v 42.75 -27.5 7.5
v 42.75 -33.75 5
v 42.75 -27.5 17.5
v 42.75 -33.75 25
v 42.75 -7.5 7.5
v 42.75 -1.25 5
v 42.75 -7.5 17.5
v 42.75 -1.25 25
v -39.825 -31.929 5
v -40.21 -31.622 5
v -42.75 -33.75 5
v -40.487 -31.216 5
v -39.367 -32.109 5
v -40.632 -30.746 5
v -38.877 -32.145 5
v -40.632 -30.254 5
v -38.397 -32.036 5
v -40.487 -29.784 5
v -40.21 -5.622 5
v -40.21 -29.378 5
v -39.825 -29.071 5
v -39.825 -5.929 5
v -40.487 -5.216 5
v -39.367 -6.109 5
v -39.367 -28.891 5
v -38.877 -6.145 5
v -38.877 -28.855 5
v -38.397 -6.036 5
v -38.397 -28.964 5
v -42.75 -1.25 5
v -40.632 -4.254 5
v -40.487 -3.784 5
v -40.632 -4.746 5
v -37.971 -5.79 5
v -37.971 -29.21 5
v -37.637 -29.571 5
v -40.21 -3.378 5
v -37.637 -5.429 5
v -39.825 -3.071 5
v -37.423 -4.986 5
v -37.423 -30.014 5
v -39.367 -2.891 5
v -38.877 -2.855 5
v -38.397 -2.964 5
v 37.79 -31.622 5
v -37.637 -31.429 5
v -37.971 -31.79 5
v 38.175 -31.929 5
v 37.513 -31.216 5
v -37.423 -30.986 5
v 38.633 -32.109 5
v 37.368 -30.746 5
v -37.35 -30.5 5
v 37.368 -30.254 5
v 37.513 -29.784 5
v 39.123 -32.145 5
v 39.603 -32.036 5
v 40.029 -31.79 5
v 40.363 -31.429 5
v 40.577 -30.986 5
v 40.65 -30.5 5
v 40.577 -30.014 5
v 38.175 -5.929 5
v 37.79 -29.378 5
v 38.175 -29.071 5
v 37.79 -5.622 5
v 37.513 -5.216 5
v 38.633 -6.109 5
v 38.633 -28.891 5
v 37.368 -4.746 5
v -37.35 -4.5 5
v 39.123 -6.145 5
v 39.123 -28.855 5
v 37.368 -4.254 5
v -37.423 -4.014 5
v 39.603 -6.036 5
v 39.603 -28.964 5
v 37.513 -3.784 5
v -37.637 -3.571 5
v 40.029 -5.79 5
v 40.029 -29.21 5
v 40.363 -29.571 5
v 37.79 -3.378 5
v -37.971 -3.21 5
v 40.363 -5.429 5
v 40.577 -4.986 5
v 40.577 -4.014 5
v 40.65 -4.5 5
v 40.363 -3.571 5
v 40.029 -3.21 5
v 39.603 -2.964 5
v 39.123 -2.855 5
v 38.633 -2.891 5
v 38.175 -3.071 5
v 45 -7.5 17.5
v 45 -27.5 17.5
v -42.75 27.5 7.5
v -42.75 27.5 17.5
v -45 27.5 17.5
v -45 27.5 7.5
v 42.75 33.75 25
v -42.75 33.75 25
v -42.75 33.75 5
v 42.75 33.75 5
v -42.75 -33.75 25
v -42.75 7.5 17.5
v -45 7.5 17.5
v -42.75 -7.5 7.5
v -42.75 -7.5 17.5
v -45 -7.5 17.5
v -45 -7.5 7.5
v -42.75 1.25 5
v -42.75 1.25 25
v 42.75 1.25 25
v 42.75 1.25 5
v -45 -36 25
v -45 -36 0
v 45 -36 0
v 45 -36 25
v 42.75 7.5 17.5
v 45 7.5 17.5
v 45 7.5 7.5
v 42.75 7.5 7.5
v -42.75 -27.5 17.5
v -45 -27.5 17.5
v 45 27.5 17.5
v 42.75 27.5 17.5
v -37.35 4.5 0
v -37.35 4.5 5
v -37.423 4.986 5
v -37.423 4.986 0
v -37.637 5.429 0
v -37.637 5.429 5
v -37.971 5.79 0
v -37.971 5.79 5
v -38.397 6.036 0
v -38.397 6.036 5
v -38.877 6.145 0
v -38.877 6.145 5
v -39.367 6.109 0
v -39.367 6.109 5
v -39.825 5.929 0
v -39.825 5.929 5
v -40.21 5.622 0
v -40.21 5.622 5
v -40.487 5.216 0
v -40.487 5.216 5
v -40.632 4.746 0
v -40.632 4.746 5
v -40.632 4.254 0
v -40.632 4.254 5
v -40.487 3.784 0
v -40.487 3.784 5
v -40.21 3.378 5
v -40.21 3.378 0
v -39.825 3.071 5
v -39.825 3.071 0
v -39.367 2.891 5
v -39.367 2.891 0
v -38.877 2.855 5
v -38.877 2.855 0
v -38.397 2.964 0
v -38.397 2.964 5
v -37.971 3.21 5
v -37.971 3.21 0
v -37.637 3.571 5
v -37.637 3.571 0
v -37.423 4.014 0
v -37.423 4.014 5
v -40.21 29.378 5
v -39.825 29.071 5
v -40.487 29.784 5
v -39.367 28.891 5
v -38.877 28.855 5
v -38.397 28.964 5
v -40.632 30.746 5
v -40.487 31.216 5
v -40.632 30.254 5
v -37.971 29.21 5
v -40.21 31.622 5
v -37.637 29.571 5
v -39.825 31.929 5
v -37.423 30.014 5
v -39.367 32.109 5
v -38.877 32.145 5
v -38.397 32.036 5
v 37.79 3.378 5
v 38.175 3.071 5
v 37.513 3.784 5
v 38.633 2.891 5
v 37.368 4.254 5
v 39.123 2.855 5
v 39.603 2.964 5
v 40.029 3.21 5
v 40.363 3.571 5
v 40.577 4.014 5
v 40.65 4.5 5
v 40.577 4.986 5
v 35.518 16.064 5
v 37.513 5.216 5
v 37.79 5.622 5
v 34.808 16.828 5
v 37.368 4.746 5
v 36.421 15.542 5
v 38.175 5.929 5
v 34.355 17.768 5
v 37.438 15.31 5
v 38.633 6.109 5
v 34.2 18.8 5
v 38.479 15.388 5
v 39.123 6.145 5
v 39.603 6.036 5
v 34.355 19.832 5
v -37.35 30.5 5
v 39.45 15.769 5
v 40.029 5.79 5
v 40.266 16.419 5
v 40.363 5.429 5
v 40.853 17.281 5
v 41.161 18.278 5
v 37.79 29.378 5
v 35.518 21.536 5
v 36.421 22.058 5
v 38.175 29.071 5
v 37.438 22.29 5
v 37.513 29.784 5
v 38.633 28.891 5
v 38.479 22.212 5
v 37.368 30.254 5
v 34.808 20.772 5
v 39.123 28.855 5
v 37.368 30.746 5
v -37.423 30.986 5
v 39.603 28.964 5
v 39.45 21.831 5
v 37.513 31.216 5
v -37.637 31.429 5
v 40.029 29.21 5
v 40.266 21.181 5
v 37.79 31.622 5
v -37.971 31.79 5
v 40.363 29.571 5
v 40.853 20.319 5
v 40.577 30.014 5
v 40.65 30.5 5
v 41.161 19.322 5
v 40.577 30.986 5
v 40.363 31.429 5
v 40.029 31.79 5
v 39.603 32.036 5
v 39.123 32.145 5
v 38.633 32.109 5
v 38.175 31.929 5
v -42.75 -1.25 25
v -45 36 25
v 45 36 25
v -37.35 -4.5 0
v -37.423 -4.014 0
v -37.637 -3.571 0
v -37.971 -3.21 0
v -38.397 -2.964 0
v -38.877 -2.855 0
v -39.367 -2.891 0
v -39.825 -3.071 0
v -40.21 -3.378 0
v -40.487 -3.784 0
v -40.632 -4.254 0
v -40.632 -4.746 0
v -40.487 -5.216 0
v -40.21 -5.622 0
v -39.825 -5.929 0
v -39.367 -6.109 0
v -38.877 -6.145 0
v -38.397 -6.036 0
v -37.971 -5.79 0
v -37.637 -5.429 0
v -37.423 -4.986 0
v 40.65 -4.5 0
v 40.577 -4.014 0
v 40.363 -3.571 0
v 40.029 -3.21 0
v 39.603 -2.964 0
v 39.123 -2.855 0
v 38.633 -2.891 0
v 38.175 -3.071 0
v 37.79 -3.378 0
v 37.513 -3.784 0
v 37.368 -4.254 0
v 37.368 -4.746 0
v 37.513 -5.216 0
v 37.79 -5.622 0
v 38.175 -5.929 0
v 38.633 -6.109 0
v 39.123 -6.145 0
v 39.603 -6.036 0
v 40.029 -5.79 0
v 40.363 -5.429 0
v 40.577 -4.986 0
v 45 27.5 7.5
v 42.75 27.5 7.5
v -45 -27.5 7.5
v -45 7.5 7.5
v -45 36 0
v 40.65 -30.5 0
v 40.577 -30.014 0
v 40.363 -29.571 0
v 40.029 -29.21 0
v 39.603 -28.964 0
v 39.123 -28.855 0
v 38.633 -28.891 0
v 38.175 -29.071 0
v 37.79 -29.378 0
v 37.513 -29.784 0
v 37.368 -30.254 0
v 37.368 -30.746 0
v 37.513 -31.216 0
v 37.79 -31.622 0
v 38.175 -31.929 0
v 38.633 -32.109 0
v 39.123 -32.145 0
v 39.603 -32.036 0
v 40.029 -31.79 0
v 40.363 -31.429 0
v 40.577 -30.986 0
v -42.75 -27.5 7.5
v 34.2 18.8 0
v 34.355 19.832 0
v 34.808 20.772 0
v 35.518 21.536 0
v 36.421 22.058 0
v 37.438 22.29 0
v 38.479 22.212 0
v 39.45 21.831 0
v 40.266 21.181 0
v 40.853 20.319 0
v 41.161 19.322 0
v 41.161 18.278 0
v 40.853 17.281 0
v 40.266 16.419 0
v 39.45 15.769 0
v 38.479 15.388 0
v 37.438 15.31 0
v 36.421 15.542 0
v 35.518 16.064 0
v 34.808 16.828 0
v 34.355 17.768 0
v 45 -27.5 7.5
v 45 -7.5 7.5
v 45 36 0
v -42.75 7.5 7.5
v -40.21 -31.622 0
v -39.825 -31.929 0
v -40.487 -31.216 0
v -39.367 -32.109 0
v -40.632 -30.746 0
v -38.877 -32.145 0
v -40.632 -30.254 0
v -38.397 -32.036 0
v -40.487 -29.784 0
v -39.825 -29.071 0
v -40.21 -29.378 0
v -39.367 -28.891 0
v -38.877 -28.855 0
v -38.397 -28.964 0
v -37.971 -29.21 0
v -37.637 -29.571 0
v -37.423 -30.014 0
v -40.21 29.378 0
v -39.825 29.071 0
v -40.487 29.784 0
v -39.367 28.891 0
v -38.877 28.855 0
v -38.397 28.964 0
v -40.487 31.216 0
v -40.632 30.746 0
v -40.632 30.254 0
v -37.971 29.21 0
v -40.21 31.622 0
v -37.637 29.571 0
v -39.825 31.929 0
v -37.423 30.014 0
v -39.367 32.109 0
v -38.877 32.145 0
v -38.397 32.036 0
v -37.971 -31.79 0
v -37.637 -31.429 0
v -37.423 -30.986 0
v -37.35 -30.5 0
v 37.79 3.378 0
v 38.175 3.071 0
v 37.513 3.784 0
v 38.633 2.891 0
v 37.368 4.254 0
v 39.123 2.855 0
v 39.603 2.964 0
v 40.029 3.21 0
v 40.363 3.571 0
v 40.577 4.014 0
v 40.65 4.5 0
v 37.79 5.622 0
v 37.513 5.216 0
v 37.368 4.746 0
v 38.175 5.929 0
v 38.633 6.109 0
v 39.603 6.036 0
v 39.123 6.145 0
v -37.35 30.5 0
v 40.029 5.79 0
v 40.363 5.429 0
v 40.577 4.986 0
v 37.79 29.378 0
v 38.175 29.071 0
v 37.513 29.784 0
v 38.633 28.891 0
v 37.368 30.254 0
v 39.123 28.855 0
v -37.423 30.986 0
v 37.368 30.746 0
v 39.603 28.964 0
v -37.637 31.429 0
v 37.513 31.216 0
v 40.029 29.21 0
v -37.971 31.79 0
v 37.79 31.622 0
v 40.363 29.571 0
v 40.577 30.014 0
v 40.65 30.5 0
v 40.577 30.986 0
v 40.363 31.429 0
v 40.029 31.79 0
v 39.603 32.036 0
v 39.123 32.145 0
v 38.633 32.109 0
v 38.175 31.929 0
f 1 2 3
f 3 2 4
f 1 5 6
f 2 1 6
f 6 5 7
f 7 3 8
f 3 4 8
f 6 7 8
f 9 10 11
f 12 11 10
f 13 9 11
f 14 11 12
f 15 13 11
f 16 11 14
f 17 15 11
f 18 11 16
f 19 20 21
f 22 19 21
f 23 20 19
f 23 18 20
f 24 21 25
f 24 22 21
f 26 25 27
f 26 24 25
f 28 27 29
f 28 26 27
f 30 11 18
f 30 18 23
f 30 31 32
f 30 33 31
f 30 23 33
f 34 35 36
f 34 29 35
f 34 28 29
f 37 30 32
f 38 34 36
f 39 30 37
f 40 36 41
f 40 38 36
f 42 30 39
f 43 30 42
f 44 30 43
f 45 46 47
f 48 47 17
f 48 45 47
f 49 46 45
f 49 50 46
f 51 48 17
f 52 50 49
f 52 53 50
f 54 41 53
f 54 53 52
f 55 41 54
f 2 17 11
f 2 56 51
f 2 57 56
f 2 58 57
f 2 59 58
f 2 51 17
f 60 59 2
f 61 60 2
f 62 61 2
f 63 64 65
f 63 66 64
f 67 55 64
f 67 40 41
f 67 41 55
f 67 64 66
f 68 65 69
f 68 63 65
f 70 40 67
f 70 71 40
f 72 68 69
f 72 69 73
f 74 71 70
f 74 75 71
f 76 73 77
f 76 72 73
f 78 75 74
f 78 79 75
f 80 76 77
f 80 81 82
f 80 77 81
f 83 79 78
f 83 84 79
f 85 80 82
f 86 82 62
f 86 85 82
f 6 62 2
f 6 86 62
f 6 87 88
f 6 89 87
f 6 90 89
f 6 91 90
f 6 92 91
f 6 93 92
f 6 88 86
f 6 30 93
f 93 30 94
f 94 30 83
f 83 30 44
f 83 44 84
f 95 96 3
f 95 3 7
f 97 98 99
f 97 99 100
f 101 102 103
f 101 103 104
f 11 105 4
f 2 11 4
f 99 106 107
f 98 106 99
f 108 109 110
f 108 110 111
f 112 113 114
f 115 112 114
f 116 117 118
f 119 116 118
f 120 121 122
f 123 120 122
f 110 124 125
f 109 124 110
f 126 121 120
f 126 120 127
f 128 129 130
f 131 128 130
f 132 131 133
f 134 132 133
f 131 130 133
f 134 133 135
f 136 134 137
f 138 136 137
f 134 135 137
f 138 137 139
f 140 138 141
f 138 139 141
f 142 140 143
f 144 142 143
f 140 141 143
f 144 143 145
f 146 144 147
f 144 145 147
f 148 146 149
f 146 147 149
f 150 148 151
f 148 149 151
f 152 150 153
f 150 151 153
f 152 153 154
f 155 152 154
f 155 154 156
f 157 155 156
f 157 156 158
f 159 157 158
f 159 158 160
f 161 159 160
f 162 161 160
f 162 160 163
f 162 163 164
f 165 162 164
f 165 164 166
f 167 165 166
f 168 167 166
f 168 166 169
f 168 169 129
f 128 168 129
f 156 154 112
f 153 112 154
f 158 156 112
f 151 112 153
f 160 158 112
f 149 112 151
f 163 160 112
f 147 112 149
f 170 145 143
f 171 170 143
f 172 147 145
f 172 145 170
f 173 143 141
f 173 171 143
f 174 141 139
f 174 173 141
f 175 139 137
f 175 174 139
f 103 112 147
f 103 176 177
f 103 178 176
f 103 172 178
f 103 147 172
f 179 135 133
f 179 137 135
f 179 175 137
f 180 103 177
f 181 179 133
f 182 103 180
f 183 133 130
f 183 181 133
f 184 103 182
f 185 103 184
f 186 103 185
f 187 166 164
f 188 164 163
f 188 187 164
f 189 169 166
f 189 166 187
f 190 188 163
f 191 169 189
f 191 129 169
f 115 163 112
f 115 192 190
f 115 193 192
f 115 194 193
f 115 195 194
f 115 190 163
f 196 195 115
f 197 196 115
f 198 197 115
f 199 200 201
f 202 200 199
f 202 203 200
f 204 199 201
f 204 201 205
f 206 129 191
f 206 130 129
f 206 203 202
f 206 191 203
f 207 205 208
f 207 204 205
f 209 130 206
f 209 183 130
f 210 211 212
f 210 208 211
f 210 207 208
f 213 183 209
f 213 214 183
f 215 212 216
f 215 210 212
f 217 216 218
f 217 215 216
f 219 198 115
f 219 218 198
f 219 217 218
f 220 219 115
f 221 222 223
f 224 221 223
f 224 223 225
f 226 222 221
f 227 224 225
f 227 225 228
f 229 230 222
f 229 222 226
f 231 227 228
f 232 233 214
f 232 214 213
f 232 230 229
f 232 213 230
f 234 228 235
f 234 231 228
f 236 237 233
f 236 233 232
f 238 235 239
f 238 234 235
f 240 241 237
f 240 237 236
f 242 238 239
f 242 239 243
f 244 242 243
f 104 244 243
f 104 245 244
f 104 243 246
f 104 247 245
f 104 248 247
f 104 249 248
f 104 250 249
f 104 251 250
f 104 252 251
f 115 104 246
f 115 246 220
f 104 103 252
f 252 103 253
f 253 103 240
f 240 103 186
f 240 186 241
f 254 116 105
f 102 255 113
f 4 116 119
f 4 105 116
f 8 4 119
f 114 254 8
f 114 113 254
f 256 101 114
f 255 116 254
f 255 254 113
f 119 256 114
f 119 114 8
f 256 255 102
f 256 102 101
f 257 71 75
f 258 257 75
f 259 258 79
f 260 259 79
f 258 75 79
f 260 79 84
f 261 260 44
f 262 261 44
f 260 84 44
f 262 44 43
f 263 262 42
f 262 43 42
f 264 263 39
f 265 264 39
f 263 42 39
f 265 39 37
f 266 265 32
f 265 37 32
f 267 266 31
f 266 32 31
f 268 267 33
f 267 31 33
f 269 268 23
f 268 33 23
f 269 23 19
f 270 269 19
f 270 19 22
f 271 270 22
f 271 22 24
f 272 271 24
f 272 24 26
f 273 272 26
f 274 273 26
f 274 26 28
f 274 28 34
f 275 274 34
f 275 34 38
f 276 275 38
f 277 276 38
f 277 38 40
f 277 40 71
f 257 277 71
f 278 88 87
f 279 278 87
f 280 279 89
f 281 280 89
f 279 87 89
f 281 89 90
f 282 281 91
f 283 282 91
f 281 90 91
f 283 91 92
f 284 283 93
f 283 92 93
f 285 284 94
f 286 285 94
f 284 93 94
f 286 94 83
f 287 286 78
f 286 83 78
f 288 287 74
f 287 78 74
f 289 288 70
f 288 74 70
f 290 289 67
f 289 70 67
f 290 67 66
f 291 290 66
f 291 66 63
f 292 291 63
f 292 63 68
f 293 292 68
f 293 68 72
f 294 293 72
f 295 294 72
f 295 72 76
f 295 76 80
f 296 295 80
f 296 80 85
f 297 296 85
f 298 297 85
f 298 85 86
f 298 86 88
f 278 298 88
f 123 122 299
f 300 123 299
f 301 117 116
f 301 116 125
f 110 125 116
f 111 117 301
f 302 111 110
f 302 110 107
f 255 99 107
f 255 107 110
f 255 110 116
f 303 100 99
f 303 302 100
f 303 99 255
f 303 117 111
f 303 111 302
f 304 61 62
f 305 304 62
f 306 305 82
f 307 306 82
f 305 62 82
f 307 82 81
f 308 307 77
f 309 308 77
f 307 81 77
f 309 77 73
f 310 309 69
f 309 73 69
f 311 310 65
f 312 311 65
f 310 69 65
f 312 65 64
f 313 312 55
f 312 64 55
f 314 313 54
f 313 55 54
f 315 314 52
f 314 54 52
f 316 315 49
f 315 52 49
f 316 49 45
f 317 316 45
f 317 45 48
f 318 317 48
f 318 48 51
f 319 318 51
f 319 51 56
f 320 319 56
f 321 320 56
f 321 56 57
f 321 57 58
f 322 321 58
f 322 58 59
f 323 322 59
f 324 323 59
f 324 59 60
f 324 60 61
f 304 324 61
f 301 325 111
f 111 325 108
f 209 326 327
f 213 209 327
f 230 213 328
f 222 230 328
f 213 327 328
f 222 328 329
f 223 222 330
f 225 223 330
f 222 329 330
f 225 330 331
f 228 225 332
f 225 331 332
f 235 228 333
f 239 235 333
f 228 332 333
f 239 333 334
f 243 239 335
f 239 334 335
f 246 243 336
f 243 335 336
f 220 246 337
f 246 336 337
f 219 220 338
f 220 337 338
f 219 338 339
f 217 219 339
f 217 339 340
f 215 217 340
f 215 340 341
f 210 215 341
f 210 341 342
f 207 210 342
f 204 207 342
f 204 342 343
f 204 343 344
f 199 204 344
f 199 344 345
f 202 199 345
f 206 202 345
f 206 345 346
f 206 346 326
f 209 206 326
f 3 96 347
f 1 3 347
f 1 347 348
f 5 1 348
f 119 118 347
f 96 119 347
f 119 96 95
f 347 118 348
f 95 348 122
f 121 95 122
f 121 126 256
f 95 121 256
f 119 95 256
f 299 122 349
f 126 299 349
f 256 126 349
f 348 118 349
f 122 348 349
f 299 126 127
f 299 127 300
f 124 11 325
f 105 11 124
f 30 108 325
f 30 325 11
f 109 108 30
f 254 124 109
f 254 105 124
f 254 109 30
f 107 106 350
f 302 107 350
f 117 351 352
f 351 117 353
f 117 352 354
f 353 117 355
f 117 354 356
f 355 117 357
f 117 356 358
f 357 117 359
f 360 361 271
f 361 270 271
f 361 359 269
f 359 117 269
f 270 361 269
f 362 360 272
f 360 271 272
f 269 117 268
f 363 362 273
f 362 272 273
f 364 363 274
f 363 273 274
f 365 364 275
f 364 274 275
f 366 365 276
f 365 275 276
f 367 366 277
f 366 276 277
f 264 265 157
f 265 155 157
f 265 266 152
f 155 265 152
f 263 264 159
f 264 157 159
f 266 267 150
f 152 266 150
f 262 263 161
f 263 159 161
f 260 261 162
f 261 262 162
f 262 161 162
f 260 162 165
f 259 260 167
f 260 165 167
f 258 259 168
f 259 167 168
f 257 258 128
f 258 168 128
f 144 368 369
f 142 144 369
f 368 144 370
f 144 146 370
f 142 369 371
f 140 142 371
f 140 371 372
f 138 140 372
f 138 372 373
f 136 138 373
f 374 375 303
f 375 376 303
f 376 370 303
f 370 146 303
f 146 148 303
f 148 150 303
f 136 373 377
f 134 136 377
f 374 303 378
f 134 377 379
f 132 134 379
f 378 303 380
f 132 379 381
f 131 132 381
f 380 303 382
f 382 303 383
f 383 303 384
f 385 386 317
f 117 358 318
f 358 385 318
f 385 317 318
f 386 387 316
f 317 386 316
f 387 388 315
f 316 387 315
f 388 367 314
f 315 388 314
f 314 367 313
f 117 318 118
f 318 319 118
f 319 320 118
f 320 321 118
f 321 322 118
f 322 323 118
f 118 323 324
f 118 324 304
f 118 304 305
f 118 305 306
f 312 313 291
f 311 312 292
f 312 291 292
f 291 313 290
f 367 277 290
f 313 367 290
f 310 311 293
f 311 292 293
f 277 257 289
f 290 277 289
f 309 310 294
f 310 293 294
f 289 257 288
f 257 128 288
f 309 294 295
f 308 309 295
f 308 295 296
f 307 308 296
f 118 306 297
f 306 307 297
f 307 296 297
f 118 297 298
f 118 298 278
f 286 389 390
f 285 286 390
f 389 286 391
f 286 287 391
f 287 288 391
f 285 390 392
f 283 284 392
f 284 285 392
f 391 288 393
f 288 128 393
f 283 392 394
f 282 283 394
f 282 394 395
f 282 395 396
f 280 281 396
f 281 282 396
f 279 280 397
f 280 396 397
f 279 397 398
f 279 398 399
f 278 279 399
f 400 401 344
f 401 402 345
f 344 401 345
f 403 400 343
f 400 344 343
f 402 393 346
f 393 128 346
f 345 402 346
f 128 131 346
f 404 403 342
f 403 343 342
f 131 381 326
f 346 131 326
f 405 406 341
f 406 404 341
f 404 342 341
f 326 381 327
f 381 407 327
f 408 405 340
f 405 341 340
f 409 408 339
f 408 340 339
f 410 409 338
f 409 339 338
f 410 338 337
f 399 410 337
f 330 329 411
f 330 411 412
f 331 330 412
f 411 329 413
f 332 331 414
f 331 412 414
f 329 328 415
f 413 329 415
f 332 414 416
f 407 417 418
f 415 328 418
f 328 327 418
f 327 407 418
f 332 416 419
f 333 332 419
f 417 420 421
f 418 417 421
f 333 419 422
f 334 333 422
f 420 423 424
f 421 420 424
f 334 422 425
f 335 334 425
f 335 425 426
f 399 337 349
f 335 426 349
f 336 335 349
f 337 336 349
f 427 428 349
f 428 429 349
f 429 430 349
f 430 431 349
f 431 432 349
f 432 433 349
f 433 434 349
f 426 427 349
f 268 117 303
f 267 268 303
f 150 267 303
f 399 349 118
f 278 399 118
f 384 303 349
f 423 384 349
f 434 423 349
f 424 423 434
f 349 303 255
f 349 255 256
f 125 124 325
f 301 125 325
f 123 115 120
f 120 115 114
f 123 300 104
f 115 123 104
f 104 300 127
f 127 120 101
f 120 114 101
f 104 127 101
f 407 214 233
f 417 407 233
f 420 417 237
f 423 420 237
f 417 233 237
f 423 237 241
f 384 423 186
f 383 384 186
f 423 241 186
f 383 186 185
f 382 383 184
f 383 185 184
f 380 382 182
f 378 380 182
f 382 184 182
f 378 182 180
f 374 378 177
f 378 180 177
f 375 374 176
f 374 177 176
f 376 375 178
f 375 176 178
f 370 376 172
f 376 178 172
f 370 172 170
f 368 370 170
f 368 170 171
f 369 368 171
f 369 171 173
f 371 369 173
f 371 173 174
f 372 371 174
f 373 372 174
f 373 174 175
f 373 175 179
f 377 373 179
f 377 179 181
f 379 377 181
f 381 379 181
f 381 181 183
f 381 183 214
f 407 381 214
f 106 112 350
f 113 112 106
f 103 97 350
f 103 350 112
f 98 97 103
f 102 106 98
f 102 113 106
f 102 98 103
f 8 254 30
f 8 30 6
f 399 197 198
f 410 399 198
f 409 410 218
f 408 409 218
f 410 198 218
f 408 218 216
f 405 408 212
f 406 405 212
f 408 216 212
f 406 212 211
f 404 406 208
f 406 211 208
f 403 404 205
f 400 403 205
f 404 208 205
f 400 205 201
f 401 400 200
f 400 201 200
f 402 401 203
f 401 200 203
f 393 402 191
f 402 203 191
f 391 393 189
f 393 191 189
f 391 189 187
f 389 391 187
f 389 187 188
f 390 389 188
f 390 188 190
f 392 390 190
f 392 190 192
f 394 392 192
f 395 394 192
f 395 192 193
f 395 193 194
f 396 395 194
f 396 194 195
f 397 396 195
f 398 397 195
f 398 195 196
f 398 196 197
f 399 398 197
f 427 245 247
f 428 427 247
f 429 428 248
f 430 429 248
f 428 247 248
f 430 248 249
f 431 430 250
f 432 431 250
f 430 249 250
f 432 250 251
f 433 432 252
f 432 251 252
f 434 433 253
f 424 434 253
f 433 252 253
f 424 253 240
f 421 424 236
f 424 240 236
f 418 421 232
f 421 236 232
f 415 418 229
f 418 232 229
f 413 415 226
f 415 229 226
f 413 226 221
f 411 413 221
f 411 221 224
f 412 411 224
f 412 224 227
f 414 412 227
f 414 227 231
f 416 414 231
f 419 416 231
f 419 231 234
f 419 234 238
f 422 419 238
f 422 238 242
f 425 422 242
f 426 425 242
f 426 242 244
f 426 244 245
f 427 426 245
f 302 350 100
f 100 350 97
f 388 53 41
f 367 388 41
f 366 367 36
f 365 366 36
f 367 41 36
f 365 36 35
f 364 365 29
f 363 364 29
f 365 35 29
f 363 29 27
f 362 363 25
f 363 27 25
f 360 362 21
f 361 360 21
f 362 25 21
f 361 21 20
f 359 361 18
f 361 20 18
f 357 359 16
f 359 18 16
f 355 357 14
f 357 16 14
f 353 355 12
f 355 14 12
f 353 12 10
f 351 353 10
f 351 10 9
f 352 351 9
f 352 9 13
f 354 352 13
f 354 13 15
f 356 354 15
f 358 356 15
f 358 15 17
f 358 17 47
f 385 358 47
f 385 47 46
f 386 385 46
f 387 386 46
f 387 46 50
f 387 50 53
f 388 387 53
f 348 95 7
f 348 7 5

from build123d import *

# Parameters (mm, degrees)
SKETCH_1_W               = 90
SKETCH_1_H               = 72
EXTRUDE_1_DEPTH          = 25
SKETCH_2_W               = 85.5
SKETCH_2_H               = 32.5
CUT_EXTRUDE_1_DEPTH      = 20
SKETCH_3_W               = 10
SKETCH_3_H               = 20
CUT_EXTRUDE_2_DEPTH      = 1
CUT_EXTRUDE_2_DEPTH_BACK = 91
SKETCH_4_R               = 1.65
CUT_EXTRUDE_3_DEPTH      = 21
CUT_EXTRUDE_3_DEPTH_BACK = 6
SKETCH_5_R               = 3.5
CUT_EXTRUDE_4_DEPTH      = 1
CUT_EXTRUDE_4_DEPTH_BACK = 26


with BuildPart() as part:
    # 草图1 → 凸台-拉伸1 (new body)
    with BuildSketch(Plane.XY):
        Rectangle(SKETCH_1_W, SKETCH_1_H)
    extrude(amount=EXTRUDE_1_DEPTH)

    # 草图2 → 切除-拉伸1 (cut)
    with BuildSketch(Plane.XY.offset(25)):
        with Locations((0, 17.5)):
            Rectangle(SKETCH_2_W, SKETCH_2_H)
        with Locations((0, -17.5)):
            Rectangle(SKETCH_2_W, SKETCH_2_H)
    extrude(amount=-CUT_EXTRUDE_1_DEPTH, mode=Mode.SUBTRACT)

    # 草图3 → 切除-拉伸2 (cut, two sides)
    with BuildSketch(Plane(origin=(45, 0, 0), x_dir=(0, 0, -1), z_dir=(1, 0, 0))) as cut_extrude_2_sk:
        with Locations((-12.5, 17.5)):
            Rectangle(SKETCH_3_W, SKETCH_3_H)
        with Locations((-12.5, -17.5)):
            Rectangle(SKETCH_3_W, SKETCH_3_H)
    extrude(amount=CUT_EXTRUDE_2_DEPTH, mode=Mode.SUBTRACT)
    extrude(cut_extrude_2_sk.sketch, amount=-CUT_EXTRUDE_2_DEPTH_BACK, mode=Mode.SUBTRACT)

    # 草图4 → 切除-拉伸3 (cut, two sides)
    with BuildSketch(Plane.XY.offset(5)) as cut_extrude_3_sk:
        with Locations((-39, 4.5)):
            Circle(SKETCH_4_R)
        with Locations((-39, 30.5)):
            Circle(SKETCH_4_R)
        with Locations((-39, -4.5)):
            Circle(SKETCH_4_R)
        with Locations((-39, -30.5)):
            Circle(SKETCH_4_R)
        with Locations((39, -30.5)):
            Circle(SKETCH_4_R)
        with Locations((39, -4.5)):
            Circle(SKETCH_4_R)
        with Locations((39, 4.5)):
            Circle(SKETCH_4_R)
        with Locations((39, 30.5)):
            Circle(SKETCH_4_R)
    extrude(amount=CUT_EXTRUDE_3_DEPTH, mode=Mode.SUBTRACT)
    extrude(cut_extrude_3_sk.sketch, amount=-CUT_EXTRUDE_3_DEPTH_BACK, mode=Mode.SUBTRACT)

    # 草图5 → 切除-拉伸4 (cut, two sides)
    with BuildSketch(Plane(origin=(0, 0, 0), x_dir=(-1, 0, 0), z_dir=(0, 0, -1))) as cut_extrude_4_sk:
        with Locations((-37.7, 18.8)):
            Circle(SKETCH_5_R)
    extrude(amount=CUT_EXTRUDE_4_DEPTH, mode=Mode.SUBTRACT)
    extrude(cut_extrude_4_sk.sketch, amount=-CUT_EXTRUDE_4_DEPTH_BACK, mode=Mode.SUBTRACT)


solid = part.part
